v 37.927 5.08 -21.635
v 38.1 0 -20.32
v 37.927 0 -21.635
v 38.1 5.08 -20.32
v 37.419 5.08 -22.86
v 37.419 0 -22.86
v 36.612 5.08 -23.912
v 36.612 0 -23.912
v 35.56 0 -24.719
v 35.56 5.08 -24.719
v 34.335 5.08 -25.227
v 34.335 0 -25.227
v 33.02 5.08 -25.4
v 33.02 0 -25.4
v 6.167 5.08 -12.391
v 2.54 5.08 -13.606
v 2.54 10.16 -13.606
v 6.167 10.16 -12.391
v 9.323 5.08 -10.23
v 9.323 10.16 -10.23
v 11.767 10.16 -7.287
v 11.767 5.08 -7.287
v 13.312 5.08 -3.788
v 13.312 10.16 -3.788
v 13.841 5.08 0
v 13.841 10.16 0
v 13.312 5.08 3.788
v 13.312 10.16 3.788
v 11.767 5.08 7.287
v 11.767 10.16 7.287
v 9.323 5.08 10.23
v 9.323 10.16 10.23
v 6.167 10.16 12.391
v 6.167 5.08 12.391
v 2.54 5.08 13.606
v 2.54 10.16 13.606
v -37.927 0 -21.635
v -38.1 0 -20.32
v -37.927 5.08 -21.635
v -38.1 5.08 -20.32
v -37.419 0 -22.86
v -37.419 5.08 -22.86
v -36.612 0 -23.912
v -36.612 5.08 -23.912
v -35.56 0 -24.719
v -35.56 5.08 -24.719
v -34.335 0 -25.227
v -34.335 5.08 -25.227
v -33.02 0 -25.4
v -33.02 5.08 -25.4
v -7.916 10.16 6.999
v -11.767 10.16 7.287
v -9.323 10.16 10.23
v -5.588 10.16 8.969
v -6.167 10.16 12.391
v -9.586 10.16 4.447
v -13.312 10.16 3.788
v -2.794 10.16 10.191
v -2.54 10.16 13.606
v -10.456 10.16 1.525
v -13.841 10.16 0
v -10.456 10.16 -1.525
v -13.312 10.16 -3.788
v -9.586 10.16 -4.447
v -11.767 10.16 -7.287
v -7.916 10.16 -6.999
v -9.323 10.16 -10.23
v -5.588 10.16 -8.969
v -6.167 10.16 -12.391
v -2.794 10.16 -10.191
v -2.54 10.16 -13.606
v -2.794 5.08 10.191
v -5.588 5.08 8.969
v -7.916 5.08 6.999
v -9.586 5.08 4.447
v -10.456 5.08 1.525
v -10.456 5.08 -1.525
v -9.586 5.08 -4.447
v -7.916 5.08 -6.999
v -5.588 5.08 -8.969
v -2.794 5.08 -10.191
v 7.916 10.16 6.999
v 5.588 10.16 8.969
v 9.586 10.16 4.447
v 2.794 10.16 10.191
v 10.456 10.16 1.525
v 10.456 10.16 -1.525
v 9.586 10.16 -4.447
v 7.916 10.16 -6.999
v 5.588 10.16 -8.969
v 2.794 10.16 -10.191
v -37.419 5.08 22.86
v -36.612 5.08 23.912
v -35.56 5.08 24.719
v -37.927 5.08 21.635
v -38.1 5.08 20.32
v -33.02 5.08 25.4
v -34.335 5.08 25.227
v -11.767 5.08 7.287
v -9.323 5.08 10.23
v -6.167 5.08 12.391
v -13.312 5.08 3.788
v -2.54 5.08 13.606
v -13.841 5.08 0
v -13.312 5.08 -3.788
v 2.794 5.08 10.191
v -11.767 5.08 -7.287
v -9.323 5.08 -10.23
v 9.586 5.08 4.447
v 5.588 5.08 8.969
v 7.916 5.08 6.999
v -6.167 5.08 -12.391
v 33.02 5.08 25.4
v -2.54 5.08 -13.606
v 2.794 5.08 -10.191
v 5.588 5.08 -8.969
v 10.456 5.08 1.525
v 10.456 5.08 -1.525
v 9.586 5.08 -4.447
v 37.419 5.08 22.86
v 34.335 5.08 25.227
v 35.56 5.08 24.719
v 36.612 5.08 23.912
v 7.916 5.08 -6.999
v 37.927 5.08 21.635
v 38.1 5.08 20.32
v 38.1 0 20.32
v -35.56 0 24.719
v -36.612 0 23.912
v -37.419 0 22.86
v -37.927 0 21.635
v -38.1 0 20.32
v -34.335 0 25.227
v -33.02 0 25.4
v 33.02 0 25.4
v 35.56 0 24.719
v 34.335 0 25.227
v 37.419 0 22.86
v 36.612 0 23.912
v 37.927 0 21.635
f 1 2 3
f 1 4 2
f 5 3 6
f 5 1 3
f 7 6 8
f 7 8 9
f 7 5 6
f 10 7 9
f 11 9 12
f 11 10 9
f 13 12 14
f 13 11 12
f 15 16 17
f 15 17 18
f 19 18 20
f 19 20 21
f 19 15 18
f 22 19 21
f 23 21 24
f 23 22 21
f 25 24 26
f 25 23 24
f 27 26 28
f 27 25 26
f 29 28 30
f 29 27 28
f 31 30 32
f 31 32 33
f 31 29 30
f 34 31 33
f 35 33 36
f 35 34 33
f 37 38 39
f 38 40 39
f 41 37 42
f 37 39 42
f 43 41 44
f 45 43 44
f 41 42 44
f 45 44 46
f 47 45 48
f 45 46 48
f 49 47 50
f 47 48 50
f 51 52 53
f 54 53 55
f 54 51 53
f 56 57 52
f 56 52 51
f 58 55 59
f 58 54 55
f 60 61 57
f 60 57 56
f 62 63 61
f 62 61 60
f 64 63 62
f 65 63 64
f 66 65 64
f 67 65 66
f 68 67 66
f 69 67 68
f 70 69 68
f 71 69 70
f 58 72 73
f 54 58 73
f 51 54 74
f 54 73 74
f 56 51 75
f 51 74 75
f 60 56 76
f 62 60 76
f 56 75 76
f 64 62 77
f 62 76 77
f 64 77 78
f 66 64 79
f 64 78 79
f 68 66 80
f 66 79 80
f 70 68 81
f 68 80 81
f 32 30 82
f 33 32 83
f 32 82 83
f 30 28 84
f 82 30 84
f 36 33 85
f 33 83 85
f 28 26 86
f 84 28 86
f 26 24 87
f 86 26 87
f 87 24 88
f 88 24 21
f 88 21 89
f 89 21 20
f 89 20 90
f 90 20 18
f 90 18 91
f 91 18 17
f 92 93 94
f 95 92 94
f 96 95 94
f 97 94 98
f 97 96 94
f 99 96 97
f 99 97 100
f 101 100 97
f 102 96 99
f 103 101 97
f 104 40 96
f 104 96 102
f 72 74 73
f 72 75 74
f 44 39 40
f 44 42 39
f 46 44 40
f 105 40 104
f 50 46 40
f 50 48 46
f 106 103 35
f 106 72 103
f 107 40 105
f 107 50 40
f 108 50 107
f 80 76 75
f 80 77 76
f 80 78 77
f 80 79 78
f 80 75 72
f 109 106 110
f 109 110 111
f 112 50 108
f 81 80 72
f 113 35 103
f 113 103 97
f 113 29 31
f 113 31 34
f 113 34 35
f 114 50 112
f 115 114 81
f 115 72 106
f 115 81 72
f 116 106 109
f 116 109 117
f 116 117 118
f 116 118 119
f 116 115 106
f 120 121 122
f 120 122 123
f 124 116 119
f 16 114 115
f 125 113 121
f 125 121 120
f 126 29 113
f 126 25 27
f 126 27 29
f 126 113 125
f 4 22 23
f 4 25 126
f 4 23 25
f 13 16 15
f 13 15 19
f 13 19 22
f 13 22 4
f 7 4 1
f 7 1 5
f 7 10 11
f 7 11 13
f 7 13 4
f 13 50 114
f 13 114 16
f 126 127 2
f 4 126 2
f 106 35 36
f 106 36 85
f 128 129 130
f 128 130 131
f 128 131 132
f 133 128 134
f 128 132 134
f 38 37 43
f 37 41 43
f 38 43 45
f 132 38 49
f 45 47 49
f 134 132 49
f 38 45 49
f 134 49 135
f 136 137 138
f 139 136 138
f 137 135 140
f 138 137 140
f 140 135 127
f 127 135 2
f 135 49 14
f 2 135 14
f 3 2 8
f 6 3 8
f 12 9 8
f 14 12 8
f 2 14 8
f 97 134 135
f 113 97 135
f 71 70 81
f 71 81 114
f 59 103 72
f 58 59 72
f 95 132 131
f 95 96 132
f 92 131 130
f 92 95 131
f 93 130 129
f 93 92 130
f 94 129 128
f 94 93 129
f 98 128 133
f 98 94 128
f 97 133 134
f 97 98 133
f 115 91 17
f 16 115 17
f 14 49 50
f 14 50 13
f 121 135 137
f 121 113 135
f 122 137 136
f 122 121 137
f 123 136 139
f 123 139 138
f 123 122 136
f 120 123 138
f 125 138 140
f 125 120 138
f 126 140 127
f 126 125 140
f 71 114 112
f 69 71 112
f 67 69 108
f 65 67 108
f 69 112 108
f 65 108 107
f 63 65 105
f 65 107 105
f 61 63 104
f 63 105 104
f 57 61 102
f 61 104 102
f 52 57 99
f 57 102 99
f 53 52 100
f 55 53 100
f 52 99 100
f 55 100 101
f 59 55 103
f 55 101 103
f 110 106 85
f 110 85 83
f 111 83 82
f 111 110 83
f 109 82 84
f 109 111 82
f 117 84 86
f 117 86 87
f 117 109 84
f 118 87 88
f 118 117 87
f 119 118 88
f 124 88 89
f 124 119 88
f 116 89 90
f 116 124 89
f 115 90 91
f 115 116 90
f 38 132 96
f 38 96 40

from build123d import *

# Parameters (mm, degrees)
SKETCH1_W           = 76.2
SKETCH1_H           = 50.8
BOSS_EXTRUDE1_DEPTH = 5.08
FILLET1_R           = 5.08
BOSS_EXTRUDE2_DEPTH = 5.08


with BuildPart() as part:
    # Sketch1 → Boss-Extrude1 (new body)
    with BuildSketch(Plane(origin=(0, 0, 0), x_dir=(1, 0, 0), z_dir=(0, 1, 0))):
        Rectangle(SKETCH1_W, SKETCH1_H)
    extrude(amount=BOSS_EXTRUDE1_DEPTH)

    # Fillet1
    fillet1_edges = [part.edges().sort_by_distance(p)[0] for p in [
        (38.1, 2.54, -25.4),
        (38.1, 2.54, 25.4),
        (-38.1, 2.54, 25.4),
        (-38.1, 2.54, -25.4),
    ]]
    fillet(fillet1_edges, radius=FILLET1_R)

    # Sketch2 → Boss-Extrude2 (add)
    with BuildSketch(Plane(origin=(0, 5.08, 0), x_dir=(1, 0, 0), z_dir=(0, 1, 0))):
        with BuildLine():
            Line((2.794, 10.190953103), (2.54, 13.605741995))
            ThreePointArc((2.54, 13.605741995), (13.840802551, 0), (2.54, -13.605741995))
            Line((2.54, -13.605741995), (2.794, -10.190953103))
            ThreePointArc((2.794, -10.190953103), (10.567022341, 0), (2.794, 10.190953103))
        make_face()
        with BuildLine():
            Line((-2.794, 10.190953103), (-2.54, 13.605741995))
            ThreePointArc((-2.54, 13.605741995), (-13.840802551, 0), (-2.54, -13.605741995))
            Line((-2.54, -13.605741995), (-2.794, -10.190953103))
            ThreePointArc((-2.794, -10.190953103), (-10.567022341, 0), (-2.794, 10.190953103))
        make_face()
    extrude(amount=BOSS_EXTRUDE2_DEPTH)


solid = part.part
